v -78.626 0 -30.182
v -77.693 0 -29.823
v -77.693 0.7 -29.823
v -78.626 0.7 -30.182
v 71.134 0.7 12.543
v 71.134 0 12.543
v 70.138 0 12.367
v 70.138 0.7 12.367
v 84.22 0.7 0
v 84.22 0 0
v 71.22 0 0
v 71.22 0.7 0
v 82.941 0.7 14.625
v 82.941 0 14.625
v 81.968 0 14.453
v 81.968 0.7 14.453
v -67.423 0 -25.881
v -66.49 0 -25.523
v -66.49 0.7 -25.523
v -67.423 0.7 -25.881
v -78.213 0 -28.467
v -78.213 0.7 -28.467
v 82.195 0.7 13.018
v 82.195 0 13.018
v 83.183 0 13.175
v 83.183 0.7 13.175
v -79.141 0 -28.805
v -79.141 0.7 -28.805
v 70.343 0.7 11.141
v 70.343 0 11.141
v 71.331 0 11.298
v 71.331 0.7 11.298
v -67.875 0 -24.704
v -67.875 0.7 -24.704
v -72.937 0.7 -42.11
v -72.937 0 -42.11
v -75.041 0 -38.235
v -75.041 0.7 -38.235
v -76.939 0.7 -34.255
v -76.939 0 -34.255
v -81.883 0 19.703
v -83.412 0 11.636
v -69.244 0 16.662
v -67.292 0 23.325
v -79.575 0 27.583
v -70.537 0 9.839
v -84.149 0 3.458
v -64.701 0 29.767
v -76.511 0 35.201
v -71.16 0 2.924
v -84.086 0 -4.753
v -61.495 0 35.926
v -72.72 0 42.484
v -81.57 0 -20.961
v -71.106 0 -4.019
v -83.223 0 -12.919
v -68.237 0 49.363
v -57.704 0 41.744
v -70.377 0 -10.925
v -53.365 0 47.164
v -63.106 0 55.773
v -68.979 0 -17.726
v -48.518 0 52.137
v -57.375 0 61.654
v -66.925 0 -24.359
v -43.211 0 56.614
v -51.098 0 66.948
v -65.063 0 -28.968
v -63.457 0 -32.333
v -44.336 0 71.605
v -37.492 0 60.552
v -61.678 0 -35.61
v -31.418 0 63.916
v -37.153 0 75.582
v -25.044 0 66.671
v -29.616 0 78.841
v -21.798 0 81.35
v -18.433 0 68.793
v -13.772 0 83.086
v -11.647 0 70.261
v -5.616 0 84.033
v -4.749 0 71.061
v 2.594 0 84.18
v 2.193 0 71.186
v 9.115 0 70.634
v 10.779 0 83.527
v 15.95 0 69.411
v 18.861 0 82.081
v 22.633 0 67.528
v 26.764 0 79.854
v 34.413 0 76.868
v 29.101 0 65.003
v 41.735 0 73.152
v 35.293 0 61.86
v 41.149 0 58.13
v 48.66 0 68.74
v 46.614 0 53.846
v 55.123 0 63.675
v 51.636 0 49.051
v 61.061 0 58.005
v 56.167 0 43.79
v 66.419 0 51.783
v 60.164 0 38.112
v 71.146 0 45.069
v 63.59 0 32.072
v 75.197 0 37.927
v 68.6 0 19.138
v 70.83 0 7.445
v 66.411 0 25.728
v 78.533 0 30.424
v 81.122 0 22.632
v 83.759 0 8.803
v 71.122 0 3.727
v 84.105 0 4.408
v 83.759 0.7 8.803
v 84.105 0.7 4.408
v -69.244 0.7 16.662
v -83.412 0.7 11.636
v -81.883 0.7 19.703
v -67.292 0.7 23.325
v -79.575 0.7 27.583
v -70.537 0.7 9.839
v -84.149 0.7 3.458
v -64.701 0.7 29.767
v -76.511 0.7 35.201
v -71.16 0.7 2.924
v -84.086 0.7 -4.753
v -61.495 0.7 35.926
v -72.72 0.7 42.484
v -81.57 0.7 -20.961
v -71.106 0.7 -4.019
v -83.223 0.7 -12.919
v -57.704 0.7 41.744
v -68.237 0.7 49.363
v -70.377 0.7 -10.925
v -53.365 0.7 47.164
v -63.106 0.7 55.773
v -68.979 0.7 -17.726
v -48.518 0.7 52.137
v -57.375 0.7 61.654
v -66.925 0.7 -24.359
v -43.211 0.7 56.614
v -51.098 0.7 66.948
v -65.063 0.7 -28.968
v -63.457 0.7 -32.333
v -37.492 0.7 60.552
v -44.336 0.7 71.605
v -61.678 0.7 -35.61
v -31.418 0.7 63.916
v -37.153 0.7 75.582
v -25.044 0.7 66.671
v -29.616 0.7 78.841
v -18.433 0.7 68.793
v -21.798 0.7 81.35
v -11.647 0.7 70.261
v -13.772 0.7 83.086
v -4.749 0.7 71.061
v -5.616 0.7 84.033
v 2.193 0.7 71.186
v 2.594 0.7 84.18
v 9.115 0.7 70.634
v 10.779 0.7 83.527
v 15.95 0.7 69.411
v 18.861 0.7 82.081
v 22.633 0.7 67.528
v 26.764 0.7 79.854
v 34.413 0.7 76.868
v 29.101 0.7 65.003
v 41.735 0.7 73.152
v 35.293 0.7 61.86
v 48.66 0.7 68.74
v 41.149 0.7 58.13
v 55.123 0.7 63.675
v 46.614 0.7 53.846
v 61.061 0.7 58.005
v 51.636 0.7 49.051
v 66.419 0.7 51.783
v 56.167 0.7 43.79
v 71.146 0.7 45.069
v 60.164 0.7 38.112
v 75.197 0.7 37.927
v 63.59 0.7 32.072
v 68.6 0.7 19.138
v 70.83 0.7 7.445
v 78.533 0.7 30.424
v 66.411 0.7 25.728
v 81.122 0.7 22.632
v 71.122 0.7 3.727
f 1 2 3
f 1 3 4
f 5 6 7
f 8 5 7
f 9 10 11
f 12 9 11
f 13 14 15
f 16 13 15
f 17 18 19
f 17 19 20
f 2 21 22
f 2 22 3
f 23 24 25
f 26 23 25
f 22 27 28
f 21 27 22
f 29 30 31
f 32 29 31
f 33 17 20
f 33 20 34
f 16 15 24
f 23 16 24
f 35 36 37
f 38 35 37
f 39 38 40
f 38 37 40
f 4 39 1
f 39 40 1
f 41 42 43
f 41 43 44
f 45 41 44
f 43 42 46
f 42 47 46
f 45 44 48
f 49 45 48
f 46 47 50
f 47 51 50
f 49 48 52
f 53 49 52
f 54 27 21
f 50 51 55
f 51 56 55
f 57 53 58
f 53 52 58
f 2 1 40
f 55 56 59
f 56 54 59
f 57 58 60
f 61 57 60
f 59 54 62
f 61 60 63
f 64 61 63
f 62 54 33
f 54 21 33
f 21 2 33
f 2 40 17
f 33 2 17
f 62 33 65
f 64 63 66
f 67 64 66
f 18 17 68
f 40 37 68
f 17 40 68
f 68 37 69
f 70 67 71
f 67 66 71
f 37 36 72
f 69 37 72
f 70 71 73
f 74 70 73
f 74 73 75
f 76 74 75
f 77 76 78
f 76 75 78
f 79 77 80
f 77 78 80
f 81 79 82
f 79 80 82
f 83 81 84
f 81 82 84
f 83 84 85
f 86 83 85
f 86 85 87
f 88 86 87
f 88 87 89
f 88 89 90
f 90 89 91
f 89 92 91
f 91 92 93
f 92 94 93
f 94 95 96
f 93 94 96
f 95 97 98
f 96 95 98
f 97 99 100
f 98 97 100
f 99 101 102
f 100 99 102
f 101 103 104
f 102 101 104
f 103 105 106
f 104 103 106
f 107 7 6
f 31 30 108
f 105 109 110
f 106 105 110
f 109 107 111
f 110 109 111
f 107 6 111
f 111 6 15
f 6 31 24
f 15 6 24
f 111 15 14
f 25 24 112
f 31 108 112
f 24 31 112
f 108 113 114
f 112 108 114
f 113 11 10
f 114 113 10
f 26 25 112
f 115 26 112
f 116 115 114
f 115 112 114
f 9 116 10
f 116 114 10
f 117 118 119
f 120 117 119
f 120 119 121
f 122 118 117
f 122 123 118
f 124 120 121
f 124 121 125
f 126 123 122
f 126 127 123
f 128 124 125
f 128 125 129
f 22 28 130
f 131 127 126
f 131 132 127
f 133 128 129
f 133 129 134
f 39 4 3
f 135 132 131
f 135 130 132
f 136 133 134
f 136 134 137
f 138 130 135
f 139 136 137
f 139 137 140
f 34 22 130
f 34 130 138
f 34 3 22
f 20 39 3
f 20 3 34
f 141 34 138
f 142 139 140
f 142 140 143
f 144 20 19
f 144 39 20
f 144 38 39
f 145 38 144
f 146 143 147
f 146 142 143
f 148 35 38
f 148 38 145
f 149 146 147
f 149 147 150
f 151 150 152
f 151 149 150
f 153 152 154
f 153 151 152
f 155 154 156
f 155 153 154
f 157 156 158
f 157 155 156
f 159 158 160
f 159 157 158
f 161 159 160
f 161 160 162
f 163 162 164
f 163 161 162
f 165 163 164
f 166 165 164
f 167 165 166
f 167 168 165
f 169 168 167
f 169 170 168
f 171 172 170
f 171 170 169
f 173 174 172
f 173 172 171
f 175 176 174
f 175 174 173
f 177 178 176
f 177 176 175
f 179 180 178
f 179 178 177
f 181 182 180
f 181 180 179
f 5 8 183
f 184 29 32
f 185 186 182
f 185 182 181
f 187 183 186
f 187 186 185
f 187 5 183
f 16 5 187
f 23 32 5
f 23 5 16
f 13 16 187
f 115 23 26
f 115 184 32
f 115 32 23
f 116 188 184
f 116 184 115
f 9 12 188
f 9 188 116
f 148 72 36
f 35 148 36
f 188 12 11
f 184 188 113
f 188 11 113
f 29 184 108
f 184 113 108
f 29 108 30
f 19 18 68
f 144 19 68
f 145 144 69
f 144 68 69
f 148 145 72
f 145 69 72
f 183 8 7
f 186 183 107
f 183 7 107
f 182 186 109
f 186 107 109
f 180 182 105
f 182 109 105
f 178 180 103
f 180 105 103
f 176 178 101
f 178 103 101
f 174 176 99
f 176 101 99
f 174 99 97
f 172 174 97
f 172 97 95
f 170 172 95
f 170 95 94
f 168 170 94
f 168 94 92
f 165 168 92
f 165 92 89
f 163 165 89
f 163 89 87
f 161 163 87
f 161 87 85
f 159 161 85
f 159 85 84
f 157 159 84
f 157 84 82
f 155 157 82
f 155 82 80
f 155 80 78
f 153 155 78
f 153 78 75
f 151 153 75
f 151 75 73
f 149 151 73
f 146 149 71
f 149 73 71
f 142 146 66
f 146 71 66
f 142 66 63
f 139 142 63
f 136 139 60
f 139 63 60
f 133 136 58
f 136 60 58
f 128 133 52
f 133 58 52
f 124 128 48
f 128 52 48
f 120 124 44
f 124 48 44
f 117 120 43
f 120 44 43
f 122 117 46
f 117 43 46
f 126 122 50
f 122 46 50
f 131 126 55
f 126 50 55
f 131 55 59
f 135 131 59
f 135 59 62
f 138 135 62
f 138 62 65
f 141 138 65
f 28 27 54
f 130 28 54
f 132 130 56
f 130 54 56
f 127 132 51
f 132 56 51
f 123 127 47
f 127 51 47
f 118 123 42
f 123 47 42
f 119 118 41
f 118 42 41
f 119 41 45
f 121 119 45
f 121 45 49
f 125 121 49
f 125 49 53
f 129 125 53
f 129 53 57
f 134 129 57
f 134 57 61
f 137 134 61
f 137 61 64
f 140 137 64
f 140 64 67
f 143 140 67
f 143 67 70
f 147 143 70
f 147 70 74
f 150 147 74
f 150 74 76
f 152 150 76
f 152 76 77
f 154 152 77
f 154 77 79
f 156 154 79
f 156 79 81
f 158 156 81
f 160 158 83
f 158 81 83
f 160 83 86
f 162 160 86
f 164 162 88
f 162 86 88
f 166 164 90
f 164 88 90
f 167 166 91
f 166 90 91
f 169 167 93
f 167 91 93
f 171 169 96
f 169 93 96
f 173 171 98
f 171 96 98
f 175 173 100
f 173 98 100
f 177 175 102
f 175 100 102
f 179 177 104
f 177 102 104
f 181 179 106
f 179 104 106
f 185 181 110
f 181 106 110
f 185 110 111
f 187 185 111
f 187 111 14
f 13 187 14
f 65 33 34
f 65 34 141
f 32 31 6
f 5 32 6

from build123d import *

# Parameters (mm, degrees)
BOSS_EXTRUDE1_DEPTH = 0.7
CUT_EXTRUDE1_DEPTH  = 120.107123213
BOSS_EXTRUDE2_DEPTH = 0.7


with BuildPart() as part:
    # Sketch3 → Boss-Extrude1 (new body)
    with BuildSketch(Plane(origin=(0, 0, 0), x_dir=(1, 0, 0), z_dir=(0, 1, 0))):
        with BuildLine():
            Line((-61.678329258, 35.61), (-72.936659507, 42.11))
            ThreePointArc((-72.936659507, 42.11), (-21.797739979, -81.35027309), (84.22, 0))
            Line((84.22, 0), (71.22, 0))
            ThreePointArc((71.22, 0), (-18.433092392, -68.793237348), (-61.678329258, 35.61))
        make_face()
    extrude(amount=BOSS_EXTRUDE1_DEPTH)

    # Sketch5 → Cut-Extrude1 (cut, through all)
    with BuildSketch(Plane(origin=(0, 0, 0), x_dir=(1, 0, 0), z_dir=(0, 1, 0))):
        Polygon((-66.489597975, 25.522965367), (-80.493304373, 30.89848461), (-81.020297764, 29.488976758), (-66.924908452, 24.358674608), align=None)
    cut_extrude1 = extrude(amount=CUT_EXTRUDE1_DEPTH, mode=Mode.SUBTRACT)


with BuildPart() as cut_extrude1_piece_1:
    # of the separate pieces the step leaves, piece 1, a body of its own (cut_extrude1_pieces)
    add(part.part.solids().sort_by_distance((84.22, 0, 0))[0])



with BuildPart() as cut_extrude1_piece_2:
    # of the separate pieces the step leaves, piece 2, a body of its own (cut_extrude1_pieces)
    add(part.part.solids().sort_by_distance((-72.936659507, 0, -42.11))[0])


with BuildPart() as cut_extrude1_piece_1_1:
    add(cut_extrude1_piece_1.part)

    add(cut_extrude1_piece_2.part)  # Boss-Extrude2 merges Cut-Extrude1 piece 2
    # Sketch6 → Boss-Extrude2 (add)
    with BuildSketch(Plane(origin=(0, 0, 0), x_dir=(1, 0, 0), z_dir=(0, 1, 0))):
        Polygon((-77.692563093, 29.823380761), (-67.423178402, 25.881333316), (-67.943747449, 24.525204583), (-78.213132141, 28.467252028), align=None)
    boss_extrude2 = extrude(amount=BOSS_EXTRUDE2_DEPTH)

    # Mirror1: Cut-Extrude1, Boss-Extrude2 across plane
    add(cut_extrude1.mirror(Plane(origin=(0, 0, 0), x_dir=(-0.25881904510251774, 0, 0.9659258262890691), z_dir=(0.9659258262890692, 0, 0.25881904510251774))), mode=Mode.SUBTRACT)
    add(boss_extrude2.mirror(Plane(origin=(0, 0, 0), x_dir=(-0.25881904510251774, 0, 0.9659258262890691), z_dir=(0.9659258262890692, 0, 0.25881904510251774))))


solid = cut_extrude1_piece_1_1.part
